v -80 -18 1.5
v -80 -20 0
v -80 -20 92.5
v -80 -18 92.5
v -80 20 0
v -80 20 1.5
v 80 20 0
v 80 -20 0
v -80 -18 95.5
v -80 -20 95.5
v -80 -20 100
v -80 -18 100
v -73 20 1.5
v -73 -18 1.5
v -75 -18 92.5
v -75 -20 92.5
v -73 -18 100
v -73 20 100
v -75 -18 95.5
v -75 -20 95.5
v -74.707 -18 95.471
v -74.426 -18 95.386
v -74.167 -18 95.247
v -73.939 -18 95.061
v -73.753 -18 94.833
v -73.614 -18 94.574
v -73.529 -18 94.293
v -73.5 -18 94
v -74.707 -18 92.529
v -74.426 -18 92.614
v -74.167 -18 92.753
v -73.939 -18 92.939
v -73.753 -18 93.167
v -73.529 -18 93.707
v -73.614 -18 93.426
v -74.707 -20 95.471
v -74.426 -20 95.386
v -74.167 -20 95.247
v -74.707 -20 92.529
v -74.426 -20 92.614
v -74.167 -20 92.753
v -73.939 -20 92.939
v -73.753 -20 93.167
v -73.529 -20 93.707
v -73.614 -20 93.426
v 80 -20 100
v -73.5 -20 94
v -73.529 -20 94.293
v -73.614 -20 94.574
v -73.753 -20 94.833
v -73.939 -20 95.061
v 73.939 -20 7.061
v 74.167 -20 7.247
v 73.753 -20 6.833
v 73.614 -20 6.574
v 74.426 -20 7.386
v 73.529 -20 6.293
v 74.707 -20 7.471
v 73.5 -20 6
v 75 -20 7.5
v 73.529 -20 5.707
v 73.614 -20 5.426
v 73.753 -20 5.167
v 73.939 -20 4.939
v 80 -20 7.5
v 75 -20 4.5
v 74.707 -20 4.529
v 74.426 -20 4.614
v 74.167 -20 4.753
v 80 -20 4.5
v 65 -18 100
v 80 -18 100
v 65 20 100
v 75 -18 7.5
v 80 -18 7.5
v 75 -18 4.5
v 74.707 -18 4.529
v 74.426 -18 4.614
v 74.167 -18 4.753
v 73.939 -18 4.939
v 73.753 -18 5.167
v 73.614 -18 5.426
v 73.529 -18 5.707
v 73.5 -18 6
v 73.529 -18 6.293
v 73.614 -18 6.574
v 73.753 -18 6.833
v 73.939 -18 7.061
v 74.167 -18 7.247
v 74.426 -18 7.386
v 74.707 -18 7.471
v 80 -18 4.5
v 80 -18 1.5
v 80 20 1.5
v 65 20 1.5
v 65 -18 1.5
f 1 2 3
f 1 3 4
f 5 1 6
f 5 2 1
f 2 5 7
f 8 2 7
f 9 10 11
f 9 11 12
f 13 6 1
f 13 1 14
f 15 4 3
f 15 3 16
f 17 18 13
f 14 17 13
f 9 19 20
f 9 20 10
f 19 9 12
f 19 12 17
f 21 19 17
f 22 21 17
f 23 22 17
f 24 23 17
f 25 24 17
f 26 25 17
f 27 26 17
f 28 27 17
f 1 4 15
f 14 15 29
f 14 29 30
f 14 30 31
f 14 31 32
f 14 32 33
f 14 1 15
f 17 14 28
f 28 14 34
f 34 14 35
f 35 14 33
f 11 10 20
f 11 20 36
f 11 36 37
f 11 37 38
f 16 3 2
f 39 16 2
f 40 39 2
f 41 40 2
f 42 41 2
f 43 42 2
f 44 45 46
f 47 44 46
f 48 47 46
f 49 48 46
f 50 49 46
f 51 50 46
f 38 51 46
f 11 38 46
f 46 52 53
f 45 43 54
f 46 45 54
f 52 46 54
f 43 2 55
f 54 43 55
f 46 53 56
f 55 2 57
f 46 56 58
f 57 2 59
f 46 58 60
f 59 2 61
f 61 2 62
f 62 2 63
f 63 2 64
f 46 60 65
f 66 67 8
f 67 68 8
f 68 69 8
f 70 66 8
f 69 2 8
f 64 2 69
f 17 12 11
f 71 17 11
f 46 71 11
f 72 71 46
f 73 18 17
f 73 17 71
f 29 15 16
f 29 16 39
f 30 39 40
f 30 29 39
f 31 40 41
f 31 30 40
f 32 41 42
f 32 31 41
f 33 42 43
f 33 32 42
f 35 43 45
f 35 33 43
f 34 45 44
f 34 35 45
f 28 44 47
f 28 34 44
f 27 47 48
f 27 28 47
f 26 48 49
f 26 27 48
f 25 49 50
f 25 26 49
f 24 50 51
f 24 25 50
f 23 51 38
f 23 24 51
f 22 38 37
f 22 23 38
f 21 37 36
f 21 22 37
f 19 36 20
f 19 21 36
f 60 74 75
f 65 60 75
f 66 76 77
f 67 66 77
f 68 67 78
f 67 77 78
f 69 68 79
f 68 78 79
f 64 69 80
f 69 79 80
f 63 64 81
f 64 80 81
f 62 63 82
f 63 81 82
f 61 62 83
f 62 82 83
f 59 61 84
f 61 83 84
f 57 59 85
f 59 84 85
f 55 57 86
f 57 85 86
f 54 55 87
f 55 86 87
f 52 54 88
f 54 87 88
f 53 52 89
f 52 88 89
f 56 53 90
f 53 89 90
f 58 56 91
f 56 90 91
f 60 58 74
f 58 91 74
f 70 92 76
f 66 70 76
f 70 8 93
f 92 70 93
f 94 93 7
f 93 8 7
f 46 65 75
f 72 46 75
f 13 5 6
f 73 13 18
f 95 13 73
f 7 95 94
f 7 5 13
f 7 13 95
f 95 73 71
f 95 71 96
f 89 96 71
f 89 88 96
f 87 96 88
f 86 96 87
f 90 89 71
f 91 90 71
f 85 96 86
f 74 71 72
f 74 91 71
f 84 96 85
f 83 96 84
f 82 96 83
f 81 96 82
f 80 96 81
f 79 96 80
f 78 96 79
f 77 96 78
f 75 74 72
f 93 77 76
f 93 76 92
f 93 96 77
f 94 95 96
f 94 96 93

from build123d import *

# Parameters (mm, degrees)
SKETCH1_W           = 160
SKETCH1_H           = 40
BOSS_EXTRUDE1_DEPTH = 100
SKETCH2_W           = 7
SKETCH2_H           = 98.5
SKETCH2_W_2         = 15
CUT_EXTRUDE1_DEPTH  = 38
CUT_EXTRUDE2_DEPTH  = 2


with BuildPart() as part:
    # Sketch1 → Boss-Extrude1 (new body)
    with BuildSketch(Plane.XY):
        Rectangle(SKETCH1_W, SKETCH1_H)
    extrude(amount=BOSS_EXTRUDE1_DEPTH)

    # Sketch2 → Cut-Extrude1 (cut)
    with BuildSketch(Plane(origin=(0, 20, 0), x_dir=(1, 0, 0), z_dir=(0, 1, 0))):
        with Locations((-76.5, -50.75)):
            Rectangle(SKETCH2_W, SKETCH2_H)
        with Locations((72.5, -50.75)):
            Rectangle(SKETCH2_W_2, SKETCH2_H)
    extrude(amount=-CUT_EXTRUDE1_DEPTH, mode=Mode.SUBTRACT)

    # Sketch3 → Cut-Extrude2 (cut)
    with BuildSketch(Plane(origin=(0, -18, 0), x_dir=(1, 0, 0), z_dir=(0, 1, 0))):
        with BuildLine():
            Line((80, -4.5), (75, -4.5))
            ThreePointArc((75, -4.5), (73.5, -6), (75, -7.5))
            Line((75, -7.5), (80, -7.5))
            Line((80, -7.5), (80, -4.5))
        make_face()
        with BuildLine():
            Line((-80, -92.5), (-75, -92.5))
            ThreePointArc((-75, -92.5), (-73.5, -94), (-75, -95.5))
            Line((-75, -95.5), (-80, -95.5))
            Line((-80, -95.5), (-80, -92.5))
        make_face()
    extrude(amount=-CUT_EXTRUDE2_DEPTH, mode=Mode.SUBTRACT)


solid = part.part
